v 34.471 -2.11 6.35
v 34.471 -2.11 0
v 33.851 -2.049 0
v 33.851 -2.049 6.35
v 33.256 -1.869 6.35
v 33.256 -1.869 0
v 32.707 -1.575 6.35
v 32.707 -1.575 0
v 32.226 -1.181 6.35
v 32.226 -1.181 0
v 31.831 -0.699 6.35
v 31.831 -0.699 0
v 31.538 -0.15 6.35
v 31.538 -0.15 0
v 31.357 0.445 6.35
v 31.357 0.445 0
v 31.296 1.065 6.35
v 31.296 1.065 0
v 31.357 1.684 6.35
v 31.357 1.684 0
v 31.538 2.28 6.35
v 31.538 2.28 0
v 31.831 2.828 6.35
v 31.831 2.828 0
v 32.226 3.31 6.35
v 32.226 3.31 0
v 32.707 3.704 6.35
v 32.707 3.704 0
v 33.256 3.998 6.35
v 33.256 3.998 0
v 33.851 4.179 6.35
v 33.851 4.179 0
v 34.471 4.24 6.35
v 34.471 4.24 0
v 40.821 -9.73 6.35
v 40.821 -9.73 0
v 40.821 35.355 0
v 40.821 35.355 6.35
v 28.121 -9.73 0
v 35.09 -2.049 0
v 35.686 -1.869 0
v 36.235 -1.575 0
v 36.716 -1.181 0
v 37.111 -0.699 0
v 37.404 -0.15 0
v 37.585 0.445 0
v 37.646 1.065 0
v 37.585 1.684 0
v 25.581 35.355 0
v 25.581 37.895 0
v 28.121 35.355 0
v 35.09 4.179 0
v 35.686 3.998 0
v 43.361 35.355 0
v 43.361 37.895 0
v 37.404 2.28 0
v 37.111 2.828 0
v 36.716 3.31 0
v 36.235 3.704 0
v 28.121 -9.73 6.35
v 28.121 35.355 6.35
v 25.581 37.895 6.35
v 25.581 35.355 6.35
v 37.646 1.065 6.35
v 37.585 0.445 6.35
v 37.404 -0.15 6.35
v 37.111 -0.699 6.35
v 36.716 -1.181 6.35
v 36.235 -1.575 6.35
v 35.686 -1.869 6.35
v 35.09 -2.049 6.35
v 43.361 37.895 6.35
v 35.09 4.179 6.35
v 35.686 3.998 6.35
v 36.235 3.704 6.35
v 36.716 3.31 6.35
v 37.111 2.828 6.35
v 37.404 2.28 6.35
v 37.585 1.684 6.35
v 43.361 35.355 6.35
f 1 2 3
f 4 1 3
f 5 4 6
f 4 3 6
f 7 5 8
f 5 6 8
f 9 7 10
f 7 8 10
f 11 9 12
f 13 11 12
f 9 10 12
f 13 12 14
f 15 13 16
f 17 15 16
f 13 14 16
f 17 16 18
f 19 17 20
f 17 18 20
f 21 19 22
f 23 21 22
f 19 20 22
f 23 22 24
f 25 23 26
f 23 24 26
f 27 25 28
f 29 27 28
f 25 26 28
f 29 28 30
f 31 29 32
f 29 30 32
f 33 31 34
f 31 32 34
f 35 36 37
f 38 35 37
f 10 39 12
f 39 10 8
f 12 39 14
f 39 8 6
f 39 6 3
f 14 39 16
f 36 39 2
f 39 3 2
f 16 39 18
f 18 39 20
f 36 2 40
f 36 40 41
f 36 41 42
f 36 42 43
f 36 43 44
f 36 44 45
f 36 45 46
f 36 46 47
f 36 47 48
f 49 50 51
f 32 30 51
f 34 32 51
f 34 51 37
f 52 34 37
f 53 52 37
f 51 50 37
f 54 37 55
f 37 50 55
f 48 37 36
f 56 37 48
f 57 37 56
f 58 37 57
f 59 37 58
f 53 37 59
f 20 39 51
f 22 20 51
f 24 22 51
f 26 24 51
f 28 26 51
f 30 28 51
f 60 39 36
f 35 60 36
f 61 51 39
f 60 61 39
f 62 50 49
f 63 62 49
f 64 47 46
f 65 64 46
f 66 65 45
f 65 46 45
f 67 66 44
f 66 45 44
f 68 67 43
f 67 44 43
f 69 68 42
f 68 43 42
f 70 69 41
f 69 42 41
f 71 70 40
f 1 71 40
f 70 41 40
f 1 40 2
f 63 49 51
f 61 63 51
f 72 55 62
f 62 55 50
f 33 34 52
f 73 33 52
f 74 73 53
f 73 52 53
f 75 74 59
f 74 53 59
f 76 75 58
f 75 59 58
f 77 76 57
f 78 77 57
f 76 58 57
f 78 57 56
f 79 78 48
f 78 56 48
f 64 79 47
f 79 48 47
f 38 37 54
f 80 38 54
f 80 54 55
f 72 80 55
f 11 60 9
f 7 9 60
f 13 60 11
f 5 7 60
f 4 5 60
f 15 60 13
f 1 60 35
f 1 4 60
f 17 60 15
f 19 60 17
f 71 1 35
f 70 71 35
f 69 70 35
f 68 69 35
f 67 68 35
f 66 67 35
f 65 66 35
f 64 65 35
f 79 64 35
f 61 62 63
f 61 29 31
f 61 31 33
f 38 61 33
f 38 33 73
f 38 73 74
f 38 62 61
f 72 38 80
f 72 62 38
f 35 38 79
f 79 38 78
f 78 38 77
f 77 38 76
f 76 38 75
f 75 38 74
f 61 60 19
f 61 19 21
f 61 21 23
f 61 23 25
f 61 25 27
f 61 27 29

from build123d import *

# Parameters (mm, degrees)
F1_DEPTH = 6.35


with BuildPart() as f1:
    # F0 (on Top) → F1 (new body)
    with BuildSketch(Plane.XY):
        with BuildLine():
            Line((34.47086, -2.110446), (34.47086, -9.730446))
            Line((34.47086, -9.730446), (40.82086, -9.730446))
            Line((40.82086, -9.730446), (40.82086, 35.354554))
            Line((40.82086, 35.354554), (43.36086, 35.354554))
            Line((43.36086, 35.354554), (43.36086, 37.894554))
            Line((43.36086, 37.894554), (34.47086, 37.894554))
            Line((34.47086, 37.894554), (34.47086, 35.354554))
            Line((34.47086, 35.354554), (34.47086, 4.239554))
            ThreePointArc((34.47086, 4.239554), (36.715924, 3.309618), (37.64586, 1.064554))
            ThreePointArc((37.64586, 1.064554), (36.715924, -1.18051), (34.47086, -2.110446))
        make_face()
        with BuildLine():
            Line((28.12086, -9.730446), (34.47086, -9.730446))
            Line((34.47086, -9.730446), (34.47086, -2.110446))
            ThreePointArc((34.47086, -2.110446), (31.29586, 1.064554), (34.47086, 4.239554))
            Line((34.47086, 4.239554), (34.47086, 35.354554))
            Line((34.47086, 35.354554), (34.47086, 37.894554))
            Line((34.47086, 37.894554), (25.58086, 37.894554))
            Line((25.58086, 37.894554), (25.58086, 35.354554))
            Line((25.58086, 35.354554), (28.12086, 35.354554))
            Line((28.12086, 35.354554), (28.12086, -9.730446))
        make_face()
    extrude(amount=F1_DEPTH)


solid = f1.part
